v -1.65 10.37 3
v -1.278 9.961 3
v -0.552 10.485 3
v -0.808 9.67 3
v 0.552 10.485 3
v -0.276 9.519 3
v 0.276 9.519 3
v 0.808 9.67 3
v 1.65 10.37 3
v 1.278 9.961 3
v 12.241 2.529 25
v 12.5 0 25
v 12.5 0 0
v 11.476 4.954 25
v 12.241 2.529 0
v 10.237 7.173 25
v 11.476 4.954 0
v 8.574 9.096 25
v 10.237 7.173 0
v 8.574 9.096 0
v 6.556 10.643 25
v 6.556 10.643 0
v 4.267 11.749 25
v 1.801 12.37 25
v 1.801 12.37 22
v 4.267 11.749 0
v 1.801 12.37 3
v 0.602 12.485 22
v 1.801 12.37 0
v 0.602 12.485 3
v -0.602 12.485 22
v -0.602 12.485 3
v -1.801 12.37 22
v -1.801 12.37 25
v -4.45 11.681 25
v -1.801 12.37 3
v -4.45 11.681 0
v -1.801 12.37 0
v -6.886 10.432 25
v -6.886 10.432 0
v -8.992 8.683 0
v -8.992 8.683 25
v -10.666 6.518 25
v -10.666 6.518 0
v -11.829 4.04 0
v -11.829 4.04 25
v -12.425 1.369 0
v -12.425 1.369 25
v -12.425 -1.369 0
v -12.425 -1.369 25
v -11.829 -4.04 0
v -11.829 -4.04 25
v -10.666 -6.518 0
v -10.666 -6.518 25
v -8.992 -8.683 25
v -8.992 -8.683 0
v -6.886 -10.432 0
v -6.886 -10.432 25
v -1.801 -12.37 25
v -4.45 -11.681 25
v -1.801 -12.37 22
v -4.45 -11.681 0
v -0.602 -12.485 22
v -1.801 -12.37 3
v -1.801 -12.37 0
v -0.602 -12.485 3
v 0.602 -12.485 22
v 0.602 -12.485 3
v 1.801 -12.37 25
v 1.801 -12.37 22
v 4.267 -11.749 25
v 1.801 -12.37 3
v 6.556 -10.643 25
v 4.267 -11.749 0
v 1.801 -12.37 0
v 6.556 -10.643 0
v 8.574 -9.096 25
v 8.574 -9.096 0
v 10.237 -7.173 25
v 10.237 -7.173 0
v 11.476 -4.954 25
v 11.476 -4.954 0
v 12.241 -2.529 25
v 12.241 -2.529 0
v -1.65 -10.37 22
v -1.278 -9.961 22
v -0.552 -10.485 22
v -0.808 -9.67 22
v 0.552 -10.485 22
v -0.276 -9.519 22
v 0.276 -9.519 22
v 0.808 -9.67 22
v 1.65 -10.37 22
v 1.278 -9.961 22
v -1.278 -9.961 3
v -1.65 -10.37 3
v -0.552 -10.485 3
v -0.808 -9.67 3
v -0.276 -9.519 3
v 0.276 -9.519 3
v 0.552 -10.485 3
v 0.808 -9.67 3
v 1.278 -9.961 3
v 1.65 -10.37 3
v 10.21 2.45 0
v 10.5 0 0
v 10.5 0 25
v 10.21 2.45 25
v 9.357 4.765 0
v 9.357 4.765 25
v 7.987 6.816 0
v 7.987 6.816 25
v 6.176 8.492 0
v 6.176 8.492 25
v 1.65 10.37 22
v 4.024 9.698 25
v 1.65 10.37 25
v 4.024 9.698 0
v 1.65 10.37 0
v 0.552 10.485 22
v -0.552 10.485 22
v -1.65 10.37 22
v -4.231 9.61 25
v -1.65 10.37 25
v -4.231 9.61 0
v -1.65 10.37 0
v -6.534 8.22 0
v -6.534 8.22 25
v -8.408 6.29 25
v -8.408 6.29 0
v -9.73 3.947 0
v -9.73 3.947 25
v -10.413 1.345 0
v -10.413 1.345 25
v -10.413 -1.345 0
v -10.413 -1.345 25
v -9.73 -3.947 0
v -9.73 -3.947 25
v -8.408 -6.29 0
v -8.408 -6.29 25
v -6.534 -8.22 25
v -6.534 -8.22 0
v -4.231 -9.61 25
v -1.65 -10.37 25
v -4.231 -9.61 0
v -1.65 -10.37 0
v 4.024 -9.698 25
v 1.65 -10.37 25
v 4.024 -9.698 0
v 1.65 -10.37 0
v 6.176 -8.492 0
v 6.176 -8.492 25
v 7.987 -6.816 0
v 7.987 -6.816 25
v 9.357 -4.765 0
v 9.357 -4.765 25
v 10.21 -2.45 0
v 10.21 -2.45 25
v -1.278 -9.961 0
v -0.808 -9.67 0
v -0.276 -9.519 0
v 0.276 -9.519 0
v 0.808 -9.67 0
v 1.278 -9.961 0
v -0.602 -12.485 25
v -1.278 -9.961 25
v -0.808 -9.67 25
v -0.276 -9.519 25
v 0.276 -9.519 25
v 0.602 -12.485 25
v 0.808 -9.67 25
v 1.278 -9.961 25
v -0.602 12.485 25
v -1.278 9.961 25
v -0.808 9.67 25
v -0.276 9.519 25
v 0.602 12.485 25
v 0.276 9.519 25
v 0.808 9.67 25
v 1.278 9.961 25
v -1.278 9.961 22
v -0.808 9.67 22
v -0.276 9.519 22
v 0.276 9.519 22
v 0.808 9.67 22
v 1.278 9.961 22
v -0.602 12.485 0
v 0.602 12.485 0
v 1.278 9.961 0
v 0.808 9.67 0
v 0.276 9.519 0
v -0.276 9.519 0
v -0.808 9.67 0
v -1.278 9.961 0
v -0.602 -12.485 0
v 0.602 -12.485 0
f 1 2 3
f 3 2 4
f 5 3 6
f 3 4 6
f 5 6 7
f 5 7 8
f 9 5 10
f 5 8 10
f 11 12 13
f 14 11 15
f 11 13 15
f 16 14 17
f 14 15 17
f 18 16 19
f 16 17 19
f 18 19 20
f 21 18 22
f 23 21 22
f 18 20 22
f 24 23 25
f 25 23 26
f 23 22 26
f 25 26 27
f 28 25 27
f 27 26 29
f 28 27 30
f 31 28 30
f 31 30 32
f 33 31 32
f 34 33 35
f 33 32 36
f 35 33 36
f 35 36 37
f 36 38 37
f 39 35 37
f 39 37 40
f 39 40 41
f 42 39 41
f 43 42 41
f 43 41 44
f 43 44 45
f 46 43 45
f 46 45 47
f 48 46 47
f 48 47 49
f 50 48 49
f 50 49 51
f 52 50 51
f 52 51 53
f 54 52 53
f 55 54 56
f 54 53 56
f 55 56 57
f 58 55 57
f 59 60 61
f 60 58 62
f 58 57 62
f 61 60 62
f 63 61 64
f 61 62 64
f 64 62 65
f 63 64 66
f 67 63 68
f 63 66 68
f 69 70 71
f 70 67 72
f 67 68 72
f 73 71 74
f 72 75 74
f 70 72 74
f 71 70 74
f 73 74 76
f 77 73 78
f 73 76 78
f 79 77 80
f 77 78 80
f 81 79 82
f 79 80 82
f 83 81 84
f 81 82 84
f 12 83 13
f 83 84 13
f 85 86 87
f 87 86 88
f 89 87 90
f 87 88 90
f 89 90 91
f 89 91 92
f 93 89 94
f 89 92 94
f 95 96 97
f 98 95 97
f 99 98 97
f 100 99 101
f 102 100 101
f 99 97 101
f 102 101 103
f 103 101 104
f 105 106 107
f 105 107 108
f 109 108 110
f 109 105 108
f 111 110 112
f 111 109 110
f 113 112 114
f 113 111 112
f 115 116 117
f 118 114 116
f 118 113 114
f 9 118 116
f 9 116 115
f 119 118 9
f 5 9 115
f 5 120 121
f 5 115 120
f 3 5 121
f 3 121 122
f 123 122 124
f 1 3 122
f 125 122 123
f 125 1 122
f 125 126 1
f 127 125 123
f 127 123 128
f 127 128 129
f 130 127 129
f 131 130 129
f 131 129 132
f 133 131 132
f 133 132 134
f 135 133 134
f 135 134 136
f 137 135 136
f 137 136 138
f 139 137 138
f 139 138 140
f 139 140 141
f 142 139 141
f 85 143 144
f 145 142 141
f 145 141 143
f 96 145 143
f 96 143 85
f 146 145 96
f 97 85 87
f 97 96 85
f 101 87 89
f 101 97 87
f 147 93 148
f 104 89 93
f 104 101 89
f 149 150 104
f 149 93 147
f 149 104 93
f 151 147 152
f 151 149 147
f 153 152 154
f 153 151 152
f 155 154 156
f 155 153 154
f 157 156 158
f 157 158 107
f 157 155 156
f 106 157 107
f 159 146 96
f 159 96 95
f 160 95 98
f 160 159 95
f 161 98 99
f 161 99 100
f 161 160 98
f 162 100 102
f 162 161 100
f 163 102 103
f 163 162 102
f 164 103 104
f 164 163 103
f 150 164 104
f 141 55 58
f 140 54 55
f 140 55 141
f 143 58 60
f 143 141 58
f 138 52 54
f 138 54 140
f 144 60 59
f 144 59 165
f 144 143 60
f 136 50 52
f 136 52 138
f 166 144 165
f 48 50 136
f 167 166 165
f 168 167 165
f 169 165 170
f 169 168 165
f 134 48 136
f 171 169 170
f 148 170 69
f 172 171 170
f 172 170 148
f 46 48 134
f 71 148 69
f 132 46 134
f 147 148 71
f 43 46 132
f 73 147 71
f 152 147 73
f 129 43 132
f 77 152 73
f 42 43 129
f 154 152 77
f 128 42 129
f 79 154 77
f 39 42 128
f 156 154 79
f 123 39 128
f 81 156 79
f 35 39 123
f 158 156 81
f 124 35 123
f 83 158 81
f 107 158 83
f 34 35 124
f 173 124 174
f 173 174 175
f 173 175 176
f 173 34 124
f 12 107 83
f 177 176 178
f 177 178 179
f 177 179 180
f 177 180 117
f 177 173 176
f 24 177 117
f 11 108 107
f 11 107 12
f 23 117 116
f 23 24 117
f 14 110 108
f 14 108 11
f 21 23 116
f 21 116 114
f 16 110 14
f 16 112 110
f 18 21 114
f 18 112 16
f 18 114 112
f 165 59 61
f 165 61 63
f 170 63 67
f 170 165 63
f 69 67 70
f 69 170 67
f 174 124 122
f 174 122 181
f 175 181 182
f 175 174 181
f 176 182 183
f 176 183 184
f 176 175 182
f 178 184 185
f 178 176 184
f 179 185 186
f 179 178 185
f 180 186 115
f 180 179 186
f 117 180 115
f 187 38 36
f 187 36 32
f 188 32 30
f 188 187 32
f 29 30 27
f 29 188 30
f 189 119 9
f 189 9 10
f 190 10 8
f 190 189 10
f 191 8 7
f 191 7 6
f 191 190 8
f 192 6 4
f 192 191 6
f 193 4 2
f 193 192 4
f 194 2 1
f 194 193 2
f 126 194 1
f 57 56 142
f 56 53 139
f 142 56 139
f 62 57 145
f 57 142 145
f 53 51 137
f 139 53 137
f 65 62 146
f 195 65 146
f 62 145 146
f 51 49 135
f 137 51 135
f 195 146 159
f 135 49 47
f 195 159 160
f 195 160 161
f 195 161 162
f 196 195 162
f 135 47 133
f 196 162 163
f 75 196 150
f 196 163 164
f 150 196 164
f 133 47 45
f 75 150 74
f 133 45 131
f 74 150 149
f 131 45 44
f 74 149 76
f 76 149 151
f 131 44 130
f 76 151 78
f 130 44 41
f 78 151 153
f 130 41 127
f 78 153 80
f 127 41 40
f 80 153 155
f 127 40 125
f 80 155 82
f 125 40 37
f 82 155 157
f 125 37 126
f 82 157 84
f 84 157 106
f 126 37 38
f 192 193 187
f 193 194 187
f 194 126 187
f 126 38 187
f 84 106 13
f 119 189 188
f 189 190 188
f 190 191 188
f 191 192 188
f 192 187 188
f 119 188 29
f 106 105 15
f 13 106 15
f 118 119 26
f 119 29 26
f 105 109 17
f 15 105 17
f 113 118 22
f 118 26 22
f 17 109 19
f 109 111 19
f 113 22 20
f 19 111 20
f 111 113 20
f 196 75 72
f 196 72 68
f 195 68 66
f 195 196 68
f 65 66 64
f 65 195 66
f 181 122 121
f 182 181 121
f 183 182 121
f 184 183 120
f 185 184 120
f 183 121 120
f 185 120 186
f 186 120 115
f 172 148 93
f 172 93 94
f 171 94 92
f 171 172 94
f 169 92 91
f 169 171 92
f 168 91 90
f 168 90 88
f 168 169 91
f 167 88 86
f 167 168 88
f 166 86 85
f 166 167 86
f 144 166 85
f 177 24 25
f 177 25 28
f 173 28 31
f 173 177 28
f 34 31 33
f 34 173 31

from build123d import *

# Parameters (mm, degrees)
F0_R     = 12.5
F0_R_2   = 10.5
F1_DEPTH = 25
F3_DEPTH = 3
F5_DEPTH = 3


with BuildPart() as f1:
    # F0 (on Top) → F1 (new body)
    with BuildSketch(Plane.XY):
        Circle(F0_R)
        Circle(F0_R_2, mode=Mode.SUBTRACT)
    extrude(amount=F1_DEPTH)

    # F2 (on face) → F3 (join)
    with BuildSketch(Plane.XY.offset(25)):
        with BuildLine():
            ThreePointArc((1.801071, 12.369565), (0, 12.5), (-1.801071, 12.369565))
            ThreePointArc((-1.801071, 12.369565), (0, 9.5), (1.801071, 12.369565))
        make_face()
        with BuildLine():
            ThreePointArc((1.801071, -12.369565), (0, -9.5), (-1.801071, -12.369565))
            ThreePointArc((-1.801071, -12.369565), (0, -12.5), (1.801071, -12.369565))
        make_face()
    extrude(amount=-F3_DEPTH)

    # F4 (on face) → F5 (join)
    with BuildSketch(Plane(origin=(0, 0, 0), x_dir=(1, 0, 0), z_dir=(0, 0, -1))):
        with BuildLine():
            ThreePointArc((1.801071, 12.369565), (0, 12.5), (-1.801071, 12.369565))
            ThreePointArc((-1.801071, 12.369565), (0, 9.5), (1.801071, 12.369565))
        make_face()
        with BuildLine():
            ThreePointArc((1.801071, -12.369565), (0, -9.5), (-1.801071, -12.369565))
            ThreePointArc((-1.801071, -12.369565), (0, -12.5), (1.801071, -12.369565))
        make_face()
    extrude(amount=-F5_DEPTH)


solid = f1.part
